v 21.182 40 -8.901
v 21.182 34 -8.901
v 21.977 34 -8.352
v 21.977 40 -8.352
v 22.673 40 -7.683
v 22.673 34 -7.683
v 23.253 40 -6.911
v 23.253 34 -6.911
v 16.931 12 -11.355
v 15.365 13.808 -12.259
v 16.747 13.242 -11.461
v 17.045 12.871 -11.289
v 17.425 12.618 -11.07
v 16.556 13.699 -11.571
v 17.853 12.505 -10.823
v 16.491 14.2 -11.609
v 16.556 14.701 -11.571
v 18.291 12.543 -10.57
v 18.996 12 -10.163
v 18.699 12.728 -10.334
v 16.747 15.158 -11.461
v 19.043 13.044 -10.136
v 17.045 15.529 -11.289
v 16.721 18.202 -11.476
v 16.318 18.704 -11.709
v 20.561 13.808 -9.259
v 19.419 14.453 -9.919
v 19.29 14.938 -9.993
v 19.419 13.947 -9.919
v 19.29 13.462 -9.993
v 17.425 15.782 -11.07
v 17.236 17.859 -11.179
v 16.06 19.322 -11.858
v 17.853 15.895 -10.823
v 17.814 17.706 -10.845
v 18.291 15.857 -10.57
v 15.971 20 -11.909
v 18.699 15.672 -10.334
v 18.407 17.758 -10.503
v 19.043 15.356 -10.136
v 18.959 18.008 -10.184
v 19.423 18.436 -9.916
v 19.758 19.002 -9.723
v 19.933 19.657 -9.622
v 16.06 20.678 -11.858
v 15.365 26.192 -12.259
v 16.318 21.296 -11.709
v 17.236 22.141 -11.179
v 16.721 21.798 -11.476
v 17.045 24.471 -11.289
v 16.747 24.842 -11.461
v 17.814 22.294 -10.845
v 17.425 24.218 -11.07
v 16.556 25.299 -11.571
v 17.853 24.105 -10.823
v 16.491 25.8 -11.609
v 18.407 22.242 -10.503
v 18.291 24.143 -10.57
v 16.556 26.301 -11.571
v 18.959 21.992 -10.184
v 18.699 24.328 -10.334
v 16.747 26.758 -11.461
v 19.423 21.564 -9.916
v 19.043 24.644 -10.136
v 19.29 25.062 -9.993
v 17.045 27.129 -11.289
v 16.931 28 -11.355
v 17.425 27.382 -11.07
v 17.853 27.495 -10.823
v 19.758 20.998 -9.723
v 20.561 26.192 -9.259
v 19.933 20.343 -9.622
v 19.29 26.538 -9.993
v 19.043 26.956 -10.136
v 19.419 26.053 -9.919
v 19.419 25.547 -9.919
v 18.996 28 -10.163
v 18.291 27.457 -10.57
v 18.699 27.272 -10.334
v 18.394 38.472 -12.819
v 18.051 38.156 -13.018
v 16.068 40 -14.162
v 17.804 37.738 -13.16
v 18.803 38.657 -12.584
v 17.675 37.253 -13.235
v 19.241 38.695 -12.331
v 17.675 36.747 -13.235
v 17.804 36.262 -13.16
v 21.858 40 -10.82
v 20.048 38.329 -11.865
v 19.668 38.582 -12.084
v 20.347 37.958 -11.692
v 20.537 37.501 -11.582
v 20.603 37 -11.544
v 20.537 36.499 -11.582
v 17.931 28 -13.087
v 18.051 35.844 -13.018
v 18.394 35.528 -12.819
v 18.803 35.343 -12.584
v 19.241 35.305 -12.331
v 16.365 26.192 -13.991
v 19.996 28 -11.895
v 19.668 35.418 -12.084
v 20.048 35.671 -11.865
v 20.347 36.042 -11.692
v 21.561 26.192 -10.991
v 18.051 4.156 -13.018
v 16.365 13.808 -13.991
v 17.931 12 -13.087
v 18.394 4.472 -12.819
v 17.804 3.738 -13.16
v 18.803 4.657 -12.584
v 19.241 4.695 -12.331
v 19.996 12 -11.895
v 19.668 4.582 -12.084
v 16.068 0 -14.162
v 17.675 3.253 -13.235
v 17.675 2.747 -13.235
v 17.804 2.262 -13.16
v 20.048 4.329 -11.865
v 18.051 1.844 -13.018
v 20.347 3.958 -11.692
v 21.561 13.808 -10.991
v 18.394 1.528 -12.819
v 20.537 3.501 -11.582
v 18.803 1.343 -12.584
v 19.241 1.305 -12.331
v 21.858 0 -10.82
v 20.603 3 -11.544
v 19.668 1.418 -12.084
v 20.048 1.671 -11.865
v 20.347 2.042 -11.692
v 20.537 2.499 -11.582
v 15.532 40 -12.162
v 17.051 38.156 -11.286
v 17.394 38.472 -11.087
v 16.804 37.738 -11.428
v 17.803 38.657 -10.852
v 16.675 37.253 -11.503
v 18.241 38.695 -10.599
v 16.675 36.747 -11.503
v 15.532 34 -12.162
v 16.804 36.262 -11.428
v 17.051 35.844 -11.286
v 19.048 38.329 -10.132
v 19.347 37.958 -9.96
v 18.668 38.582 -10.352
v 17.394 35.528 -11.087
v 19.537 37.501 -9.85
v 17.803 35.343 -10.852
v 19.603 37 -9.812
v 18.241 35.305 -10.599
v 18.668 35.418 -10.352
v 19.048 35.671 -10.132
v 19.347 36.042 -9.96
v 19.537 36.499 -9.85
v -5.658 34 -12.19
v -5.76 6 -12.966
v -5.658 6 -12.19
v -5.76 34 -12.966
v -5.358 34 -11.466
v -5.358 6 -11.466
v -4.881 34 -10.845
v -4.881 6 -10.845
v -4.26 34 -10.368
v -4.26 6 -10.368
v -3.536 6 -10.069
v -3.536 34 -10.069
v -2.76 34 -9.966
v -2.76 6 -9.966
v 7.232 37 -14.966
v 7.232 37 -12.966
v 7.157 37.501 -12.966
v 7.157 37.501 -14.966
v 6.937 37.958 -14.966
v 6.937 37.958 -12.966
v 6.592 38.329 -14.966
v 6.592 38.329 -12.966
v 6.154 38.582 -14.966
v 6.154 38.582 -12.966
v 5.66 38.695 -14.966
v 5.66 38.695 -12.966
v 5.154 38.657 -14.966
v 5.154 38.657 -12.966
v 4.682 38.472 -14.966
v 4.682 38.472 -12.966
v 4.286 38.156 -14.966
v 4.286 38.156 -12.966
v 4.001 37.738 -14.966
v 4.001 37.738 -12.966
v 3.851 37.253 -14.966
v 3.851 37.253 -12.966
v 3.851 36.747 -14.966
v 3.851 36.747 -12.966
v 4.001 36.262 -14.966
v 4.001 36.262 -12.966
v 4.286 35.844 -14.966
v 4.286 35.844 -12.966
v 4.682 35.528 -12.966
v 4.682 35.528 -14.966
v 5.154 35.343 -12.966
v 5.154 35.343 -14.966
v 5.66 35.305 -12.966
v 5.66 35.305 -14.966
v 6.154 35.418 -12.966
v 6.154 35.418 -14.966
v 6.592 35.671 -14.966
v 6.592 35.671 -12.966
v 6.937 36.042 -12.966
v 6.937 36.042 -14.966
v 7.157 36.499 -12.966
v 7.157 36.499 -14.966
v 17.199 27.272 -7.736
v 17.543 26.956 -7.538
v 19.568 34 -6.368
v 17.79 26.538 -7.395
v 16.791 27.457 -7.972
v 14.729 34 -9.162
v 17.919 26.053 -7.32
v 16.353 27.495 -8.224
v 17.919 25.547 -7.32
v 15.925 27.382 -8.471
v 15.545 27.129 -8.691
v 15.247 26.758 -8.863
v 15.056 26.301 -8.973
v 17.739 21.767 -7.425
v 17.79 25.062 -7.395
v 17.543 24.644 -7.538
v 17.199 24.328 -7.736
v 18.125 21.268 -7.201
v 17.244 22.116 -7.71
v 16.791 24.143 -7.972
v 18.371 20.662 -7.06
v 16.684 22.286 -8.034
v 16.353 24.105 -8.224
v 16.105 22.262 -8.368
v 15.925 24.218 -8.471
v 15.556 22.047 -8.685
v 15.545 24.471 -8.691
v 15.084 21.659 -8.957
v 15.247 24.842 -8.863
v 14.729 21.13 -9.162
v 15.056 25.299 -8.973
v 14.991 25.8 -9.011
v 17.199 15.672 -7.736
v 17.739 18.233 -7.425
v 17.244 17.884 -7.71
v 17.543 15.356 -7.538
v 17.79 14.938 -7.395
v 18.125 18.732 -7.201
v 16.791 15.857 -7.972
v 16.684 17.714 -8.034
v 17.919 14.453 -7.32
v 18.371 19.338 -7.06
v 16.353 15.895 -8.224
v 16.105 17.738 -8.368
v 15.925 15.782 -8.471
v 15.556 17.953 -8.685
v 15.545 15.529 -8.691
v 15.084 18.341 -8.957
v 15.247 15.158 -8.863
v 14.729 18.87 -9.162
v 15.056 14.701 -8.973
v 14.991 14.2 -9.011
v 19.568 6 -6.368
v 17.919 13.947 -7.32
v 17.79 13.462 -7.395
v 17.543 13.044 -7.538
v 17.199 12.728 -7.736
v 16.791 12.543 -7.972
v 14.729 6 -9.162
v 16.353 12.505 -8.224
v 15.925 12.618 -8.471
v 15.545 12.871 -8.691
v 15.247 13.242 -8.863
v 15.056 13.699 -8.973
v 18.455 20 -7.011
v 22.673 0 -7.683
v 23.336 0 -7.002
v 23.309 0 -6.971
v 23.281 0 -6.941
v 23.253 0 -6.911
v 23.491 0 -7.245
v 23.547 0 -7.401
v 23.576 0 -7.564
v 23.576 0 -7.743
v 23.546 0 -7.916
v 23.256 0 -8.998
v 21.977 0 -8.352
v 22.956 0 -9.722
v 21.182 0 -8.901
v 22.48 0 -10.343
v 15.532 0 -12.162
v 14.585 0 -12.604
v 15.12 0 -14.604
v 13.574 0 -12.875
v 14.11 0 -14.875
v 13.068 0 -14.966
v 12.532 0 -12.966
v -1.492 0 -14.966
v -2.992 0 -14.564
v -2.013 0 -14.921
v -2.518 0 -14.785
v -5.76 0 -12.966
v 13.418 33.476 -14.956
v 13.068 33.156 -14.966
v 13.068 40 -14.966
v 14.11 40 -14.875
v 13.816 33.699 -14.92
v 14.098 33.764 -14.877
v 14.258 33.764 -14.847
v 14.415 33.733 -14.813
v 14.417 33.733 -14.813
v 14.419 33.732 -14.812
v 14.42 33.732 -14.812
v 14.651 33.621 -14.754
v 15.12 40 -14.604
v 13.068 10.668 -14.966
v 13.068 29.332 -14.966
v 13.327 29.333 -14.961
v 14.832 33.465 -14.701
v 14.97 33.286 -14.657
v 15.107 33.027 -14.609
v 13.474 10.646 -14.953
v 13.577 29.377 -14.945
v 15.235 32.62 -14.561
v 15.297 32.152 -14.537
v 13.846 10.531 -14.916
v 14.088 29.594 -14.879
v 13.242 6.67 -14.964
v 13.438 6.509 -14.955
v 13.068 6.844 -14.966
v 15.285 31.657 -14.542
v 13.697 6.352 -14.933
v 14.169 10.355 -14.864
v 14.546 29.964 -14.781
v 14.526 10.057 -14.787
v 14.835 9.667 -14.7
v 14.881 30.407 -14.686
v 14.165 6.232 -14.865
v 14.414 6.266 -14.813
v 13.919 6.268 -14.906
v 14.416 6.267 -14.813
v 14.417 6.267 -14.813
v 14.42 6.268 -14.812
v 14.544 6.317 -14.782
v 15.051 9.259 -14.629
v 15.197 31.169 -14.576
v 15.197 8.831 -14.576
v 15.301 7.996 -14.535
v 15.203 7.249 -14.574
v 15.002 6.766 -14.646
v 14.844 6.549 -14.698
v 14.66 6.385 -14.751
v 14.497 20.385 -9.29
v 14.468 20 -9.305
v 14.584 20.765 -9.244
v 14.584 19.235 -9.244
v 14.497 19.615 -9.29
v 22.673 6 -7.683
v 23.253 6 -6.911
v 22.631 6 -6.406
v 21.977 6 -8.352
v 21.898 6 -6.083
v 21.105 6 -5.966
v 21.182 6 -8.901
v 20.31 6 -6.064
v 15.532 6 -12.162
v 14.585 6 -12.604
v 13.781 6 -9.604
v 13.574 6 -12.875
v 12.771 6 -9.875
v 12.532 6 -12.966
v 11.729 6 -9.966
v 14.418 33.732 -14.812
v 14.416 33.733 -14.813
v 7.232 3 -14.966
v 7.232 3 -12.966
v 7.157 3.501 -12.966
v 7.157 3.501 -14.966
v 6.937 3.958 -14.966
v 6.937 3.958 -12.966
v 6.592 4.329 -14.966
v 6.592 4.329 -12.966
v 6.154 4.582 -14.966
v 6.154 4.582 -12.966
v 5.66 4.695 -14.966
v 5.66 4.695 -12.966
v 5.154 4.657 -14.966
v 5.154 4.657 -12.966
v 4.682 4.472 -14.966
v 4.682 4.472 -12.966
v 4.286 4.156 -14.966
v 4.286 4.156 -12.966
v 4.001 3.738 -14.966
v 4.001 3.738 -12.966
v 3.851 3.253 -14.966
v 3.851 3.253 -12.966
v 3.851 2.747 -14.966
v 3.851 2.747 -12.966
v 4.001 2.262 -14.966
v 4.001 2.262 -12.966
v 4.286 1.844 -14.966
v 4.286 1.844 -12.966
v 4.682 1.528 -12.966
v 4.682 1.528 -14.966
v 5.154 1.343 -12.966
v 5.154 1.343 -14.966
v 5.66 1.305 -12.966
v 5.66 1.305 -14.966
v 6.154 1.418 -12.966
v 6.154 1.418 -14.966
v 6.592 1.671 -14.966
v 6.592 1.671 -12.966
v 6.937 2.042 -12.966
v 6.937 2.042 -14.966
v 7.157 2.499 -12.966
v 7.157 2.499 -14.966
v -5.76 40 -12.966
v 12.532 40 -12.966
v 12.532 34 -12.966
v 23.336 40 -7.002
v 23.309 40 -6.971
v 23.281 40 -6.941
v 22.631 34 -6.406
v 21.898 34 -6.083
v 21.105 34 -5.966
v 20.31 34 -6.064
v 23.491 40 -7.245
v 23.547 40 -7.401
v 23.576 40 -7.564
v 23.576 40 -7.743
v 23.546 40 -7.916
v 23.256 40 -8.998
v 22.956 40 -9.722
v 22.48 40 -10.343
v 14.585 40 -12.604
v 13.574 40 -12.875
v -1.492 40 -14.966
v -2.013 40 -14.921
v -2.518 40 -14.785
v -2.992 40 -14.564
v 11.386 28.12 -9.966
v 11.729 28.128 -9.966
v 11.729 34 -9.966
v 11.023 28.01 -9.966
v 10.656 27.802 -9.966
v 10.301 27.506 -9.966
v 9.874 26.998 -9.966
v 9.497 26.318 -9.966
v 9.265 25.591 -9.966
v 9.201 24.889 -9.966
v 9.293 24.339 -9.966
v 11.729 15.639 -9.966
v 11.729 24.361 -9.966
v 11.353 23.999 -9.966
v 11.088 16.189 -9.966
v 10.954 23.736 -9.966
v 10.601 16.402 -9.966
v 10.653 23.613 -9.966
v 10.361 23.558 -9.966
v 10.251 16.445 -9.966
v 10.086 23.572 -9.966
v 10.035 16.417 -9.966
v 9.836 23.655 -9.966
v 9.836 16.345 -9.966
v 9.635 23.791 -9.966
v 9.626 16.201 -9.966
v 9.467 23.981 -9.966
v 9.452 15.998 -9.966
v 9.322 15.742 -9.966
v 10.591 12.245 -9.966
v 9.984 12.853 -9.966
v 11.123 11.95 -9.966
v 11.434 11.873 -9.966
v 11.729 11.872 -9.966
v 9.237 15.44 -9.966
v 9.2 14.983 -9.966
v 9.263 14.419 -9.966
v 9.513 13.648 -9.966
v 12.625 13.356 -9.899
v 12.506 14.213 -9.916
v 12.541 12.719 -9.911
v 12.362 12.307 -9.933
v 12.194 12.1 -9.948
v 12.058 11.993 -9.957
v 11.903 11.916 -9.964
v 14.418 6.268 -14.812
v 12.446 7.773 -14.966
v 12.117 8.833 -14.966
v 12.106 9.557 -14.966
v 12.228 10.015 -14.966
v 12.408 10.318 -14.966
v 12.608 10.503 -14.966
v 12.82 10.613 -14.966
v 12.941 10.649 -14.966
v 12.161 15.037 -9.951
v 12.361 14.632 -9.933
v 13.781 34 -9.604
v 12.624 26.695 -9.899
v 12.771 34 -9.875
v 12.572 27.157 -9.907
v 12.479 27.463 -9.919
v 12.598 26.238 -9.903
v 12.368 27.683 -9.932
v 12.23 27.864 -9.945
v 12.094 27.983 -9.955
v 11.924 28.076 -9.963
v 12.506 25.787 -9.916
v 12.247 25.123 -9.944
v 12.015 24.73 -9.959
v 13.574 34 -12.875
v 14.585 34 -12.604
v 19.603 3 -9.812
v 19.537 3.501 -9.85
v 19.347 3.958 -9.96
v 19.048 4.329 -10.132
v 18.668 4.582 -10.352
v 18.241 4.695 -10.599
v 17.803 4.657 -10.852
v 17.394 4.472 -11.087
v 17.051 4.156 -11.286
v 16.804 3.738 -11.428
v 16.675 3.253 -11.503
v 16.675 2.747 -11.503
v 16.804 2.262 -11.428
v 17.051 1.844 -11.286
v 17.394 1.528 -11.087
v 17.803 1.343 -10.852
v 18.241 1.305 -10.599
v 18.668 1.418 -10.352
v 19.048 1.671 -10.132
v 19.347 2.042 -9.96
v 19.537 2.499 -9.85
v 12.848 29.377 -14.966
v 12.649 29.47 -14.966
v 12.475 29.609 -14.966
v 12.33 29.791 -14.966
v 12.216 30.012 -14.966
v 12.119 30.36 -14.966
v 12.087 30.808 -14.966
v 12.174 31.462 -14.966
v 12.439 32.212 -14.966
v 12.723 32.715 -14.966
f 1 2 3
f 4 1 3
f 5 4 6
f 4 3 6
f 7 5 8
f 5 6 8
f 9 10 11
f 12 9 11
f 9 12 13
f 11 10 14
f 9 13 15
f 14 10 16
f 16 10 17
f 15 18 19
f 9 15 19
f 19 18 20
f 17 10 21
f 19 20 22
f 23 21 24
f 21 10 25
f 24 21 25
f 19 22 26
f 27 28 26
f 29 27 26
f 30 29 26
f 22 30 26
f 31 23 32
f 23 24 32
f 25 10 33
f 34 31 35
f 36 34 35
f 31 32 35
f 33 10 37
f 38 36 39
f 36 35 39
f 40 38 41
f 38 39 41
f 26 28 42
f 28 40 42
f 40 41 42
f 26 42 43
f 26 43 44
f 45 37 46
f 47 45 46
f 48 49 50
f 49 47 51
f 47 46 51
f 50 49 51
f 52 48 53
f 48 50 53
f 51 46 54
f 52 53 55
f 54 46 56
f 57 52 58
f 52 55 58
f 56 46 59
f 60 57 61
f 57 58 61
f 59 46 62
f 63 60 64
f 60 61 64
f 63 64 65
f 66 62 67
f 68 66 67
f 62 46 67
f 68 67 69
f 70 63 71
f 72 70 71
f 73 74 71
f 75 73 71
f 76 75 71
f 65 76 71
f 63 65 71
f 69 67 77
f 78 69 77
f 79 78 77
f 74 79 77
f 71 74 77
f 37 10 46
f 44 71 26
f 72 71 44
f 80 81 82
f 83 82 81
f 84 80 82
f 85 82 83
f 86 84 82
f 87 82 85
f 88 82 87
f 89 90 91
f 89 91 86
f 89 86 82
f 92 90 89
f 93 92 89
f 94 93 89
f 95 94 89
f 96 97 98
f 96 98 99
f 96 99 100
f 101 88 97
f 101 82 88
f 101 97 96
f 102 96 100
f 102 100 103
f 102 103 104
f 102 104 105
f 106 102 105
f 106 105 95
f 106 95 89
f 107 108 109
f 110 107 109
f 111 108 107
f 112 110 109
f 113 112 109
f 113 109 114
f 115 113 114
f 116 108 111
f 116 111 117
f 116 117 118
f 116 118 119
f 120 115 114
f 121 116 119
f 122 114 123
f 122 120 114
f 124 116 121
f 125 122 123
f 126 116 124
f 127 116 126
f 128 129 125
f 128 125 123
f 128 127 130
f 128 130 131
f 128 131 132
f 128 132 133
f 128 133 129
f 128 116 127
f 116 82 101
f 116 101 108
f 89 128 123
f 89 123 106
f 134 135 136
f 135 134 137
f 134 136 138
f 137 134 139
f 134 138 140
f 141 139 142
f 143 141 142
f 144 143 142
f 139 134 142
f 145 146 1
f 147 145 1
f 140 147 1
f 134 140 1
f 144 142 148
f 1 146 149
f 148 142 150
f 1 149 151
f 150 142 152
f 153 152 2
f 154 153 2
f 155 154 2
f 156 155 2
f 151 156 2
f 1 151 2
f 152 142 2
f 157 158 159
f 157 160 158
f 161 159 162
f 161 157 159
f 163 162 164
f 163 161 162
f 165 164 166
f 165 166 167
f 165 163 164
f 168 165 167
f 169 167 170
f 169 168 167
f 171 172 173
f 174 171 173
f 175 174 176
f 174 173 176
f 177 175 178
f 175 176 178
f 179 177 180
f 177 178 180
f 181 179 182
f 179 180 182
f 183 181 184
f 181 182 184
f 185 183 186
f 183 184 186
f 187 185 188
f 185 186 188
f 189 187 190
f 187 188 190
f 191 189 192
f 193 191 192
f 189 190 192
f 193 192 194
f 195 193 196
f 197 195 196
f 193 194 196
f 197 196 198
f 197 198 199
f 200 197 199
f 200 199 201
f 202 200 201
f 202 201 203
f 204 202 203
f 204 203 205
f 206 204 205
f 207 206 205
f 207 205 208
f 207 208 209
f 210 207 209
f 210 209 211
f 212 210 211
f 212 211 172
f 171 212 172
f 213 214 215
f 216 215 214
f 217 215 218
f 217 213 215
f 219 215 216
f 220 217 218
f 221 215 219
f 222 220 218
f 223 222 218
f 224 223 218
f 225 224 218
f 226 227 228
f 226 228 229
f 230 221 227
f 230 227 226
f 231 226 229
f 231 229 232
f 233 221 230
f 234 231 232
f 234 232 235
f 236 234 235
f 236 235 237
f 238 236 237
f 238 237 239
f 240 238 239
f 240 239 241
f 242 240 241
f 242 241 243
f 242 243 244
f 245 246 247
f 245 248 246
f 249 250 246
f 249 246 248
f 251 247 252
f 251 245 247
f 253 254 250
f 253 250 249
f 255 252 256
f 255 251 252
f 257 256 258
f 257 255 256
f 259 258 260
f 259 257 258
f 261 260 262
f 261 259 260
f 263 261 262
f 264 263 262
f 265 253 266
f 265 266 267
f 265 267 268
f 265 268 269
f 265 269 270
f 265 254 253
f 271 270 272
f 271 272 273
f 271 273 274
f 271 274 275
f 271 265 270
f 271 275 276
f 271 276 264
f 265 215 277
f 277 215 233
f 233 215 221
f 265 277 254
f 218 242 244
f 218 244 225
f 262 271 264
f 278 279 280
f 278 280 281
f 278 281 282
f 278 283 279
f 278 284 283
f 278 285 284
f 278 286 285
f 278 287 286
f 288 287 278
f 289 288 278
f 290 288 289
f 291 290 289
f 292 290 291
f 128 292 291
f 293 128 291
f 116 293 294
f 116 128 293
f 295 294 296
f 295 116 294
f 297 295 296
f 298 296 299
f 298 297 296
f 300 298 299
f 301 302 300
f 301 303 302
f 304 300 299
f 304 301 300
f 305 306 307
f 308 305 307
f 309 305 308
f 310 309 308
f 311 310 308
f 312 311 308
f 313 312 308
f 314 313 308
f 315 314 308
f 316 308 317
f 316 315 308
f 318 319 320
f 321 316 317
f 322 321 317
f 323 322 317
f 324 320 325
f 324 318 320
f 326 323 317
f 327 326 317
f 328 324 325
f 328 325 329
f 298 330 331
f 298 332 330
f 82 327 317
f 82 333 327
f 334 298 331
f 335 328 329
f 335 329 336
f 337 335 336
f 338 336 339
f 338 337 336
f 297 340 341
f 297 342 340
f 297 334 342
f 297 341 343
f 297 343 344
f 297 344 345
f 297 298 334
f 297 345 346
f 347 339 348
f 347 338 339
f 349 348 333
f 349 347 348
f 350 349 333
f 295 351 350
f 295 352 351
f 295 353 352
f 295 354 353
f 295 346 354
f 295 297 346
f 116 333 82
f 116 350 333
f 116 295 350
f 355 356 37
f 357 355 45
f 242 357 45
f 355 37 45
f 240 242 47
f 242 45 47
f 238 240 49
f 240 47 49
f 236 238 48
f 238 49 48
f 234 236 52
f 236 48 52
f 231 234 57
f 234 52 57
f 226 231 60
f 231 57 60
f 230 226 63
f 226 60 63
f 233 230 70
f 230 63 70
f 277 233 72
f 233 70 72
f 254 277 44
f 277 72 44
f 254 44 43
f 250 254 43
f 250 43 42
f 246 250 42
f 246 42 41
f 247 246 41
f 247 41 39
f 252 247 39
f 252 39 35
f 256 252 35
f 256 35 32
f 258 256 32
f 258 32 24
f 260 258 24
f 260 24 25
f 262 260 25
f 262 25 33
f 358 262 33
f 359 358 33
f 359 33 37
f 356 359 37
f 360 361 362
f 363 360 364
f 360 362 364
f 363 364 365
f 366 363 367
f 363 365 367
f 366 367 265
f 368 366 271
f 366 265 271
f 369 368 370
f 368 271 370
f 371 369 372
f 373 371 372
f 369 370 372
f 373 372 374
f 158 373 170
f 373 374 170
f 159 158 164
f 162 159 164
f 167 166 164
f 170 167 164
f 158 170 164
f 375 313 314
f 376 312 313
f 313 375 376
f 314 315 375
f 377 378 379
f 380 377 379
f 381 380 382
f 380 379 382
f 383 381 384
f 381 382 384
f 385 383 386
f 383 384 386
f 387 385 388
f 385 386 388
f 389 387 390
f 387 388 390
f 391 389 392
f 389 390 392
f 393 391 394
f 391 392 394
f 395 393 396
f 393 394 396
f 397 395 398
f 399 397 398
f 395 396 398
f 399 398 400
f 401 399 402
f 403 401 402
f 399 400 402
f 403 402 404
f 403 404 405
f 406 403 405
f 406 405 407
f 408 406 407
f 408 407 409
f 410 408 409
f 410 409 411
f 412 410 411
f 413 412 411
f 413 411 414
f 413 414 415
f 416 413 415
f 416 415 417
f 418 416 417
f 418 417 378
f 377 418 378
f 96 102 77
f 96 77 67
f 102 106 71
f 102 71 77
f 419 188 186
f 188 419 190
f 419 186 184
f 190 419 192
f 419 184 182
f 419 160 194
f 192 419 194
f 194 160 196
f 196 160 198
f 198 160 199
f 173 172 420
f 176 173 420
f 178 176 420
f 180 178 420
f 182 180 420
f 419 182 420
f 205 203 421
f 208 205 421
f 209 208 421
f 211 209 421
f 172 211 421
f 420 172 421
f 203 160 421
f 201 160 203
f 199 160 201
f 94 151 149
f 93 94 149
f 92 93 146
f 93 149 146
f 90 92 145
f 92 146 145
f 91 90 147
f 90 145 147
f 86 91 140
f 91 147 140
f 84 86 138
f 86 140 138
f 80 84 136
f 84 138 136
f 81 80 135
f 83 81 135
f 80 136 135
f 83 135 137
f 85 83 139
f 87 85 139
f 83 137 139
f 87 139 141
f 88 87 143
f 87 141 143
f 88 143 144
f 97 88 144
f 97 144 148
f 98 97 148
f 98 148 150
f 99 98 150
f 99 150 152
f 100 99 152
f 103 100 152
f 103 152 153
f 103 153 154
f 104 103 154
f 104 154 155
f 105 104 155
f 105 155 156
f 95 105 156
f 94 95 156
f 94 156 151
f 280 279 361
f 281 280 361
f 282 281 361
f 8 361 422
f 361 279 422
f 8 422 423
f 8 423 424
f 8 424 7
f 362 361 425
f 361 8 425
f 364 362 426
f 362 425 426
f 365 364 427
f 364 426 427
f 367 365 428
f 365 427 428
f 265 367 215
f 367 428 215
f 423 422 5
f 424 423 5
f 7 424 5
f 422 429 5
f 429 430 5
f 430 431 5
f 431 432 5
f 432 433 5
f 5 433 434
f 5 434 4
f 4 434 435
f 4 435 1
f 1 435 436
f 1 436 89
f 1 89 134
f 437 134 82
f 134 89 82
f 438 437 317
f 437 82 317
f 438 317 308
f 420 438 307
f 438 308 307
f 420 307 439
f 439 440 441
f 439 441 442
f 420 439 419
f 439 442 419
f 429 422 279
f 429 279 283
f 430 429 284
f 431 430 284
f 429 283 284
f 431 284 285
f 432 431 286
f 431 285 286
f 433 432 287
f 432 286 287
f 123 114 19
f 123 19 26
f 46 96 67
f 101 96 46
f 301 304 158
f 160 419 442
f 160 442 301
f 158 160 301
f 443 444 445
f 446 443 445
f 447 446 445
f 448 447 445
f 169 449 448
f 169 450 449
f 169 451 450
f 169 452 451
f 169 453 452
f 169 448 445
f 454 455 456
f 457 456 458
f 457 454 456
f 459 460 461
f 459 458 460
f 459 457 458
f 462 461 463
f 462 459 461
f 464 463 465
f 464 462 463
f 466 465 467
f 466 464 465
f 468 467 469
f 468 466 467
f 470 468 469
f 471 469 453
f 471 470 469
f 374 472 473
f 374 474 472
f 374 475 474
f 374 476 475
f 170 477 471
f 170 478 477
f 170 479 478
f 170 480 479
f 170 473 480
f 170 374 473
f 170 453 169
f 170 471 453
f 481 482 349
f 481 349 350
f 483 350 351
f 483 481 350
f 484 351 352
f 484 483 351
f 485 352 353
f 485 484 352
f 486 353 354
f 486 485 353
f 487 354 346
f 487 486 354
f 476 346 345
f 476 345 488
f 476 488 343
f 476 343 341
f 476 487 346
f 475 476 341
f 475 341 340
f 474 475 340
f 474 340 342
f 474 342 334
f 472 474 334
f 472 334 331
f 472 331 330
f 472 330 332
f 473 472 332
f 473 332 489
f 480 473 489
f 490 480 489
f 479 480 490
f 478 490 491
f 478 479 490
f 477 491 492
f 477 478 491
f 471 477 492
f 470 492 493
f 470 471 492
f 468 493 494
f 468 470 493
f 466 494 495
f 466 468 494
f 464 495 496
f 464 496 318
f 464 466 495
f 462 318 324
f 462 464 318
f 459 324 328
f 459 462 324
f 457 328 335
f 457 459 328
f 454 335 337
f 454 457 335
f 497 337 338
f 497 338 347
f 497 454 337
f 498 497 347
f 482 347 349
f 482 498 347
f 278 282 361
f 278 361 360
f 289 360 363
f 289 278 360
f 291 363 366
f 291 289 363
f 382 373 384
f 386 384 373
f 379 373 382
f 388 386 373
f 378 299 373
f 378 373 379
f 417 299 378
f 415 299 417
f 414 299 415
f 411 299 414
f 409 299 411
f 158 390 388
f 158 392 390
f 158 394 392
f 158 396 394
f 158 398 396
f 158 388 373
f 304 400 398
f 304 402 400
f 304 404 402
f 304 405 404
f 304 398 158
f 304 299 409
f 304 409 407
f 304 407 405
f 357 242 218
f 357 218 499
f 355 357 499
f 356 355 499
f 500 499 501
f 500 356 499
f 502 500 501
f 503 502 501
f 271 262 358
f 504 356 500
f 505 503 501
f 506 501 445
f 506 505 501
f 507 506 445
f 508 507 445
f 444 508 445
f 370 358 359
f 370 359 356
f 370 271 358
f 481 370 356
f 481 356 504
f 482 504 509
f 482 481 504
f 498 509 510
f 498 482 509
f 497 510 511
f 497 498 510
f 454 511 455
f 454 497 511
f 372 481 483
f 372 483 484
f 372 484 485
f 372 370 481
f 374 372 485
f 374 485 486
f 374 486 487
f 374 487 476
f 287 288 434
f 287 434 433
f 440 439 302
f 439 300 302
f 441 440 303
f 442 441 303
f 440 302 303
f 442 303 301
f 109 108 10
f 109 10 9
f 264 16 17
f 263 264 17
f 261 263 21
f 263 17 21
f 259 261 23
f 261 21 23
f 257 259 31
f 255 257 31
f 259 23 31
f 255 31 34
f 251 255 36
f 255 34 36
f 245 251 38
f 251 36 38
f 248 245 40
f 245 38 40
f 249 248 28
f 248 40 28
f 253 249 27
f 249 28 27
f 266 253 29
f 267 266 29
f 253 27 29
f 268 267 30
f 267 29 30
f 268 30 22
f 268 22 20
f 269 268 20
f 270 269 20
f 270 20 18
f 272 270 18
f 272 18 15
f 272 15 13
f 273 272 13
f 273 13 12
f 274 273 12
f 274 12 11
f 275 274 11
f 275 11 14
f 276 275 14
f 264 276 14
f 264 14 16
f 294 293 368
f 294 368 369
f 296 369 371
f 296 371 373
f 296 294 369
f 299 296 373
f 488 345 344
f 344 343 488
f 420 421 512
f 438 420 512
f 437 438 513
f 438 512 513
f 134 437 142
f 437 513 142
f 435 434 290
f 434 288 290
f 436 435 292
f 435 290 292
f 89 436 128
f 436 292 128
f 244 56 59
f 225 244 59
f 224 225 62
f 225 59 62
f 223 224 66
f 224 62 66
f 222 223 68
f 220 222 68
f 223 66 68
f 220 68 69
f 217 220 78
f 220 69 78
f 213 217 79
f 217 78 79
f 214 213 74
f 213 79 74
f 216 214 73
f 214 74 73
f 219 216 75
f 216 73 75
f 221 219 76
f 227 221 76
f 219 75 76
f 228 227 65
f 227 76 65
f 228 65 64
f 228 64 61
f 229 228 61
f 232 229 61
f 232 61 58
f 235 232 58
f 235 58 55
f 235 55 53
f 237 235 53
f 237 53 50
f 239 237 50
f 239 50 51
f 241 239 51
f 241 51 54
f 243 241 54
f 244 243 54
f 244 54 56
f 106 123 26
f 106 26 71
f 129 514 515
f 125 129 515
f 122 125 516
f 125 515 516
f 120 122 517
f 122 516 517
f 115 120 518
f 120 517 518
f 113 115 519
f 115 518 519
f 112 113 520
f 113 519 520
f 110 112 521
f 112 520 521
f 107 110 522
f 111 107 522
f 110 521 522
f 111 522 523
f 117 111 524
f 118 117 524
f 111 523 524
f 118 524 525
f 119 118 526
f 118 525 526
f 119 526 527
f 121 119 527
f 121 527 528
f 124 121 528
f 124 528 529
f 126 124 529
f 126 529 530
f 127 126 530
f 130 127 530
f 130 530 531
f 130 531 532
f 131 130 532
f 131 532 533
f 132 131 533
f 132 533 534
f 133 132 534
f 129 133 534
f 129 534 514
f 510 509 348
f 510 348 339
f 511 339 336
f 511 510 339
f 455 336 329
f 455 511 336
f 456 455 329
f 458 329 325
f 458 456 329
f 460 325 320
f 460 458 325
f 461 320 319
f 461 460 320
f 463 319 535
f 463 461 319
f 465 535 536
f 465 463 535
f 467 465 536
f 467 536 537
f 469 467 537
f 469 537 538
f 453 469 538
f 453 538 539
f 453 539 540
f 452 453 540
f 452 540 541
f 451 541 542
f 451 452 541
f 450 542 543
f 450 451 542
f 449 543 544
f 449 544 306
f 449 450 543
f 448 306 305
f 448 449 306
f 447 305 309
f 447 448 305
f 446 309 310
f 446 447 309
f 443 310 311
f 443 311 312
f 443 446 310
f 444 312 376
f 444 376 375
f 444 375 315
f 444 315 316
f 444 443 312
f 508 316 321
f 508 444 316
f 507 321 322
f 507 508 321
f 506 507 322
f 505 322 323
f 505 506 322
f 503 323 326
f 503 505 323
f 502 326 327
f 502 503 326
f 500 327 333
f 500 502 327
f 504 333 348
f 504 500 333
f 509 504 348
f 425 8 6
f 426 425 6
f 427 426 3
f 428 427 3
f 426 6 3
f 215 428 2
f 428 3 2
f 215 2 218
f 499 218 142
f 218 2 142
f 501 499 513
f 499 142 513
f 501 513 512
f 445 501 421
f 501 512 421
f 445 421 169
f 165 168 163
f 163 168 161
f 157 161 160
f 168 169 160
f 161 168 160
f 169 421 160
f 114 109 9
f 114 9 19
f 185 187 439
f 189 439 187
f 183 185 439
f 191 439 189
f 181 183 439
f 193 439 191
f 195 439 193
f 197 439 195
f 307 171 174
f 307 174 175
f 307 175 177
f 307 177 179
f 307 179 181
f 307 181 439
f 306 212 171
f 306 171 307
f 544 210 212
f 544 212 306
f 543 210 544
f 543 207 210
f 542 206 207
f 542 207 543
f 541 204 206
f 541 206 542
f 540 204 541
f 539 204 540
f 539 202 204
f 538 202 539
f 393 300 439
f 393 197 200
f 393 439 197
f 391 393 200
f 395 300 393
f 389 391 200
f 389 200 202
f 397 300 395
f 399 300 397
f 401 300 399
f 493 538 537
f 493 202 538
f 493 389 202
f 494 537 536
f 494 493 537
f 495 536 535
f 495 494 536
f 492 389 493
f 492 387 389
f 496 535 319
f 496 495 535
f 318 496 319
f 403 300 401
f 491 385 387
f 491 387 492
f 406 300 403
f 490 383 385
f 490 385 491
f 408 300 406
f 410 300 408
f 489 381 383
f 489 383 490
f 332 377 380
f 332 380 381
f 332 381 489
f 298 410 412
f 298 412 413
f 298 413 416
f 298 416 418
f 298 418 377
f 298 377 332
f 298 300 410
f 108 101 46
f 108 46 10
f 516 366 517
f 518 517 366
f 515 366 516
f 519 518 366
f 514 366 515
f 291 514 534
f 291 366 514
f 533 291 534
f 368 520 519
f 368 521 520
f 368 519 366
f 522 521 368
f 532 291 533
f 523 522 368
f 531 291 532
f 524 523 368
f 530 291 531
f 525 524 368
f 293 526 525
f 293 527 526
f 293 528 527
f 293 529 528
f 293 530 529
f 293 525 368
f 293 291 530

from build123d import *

# Parameters (mm, degrees)
AUFSATZ_LINEAR_AUSTRAGEN1_DEPTH  = 40
SCHNITT_LINEAR_AUSTRAGEN3_DEPTH  = 40
SCHNITT_LINEAR_START             = -6
SCHNITT_LINEAR_AUSTRAGEN4_DEPTH  = 6
SCHNITT_LINEAR_AUSTRAGEN5_DEPTH  = 6
VERRUNDUNG1_R                    = 3
SCHNITT_LINEAR_AUSTRAGEN6_REACH  = 45.817
SKIZZE5_R                        = 1.7
SCHNITT_LINEAR_AUSTRAGEN7_REACH  = 49.001
SKIZZE6_R                        = 1.7
SCHNITT_ROTATION_D_NN1_START     = 26.307192439
SCHNITT_ROTATION_D_NN1_OUTLINE_R = 1.5
SCHNITT_ROTATION_D_NN1_DEPTH     = 11.713572656
SCHNITT_ROTATION_D_NN2_START     = -1.977078808
SCHNITT_ROTATION_D_NN2_OUTLINE_R = 1.5
SCHNITT_ROTATION_D_NN2_DEPTH     = 11.713571611
VERRUNDUNG2_R                    = 1
SCHNITT_LINEAR_AUSTRAGEN8_DEPTH  = 2
SCHNITT_LINEAR_AUSTRAGEN9_REACH  = 45.817
SKIZZE10_R                       = 2.3
SKIZZE10_R_2                     = 1.7


# Read off the part's stored shape, not the designer's step: Schnitt-Rotation-Dünn1, Schnitt-Rotation-Dünn2
with BuildPart() as part:
    # Skizze1 → Aufsatz-Linear austragen1 (new body)
    with BuildSketch(Plane(origin=(0, 0, 0), x_dir=(1, 0, 0), z_dir=(0, 1, 0))):
        with BuildLine():
            Line((-5.759831503, 14.966295554), (13.068371728, 14.966295554))
            ThreePointArc((13.068371728, 14.966295554), (14.621285998, 14.761850511), (16.068371728, 14.162447976))
            Line((16.068371728, 14.162447976), (24.666447939, 9.198346361))
            Line((24.666447939, 9.198346361), (22.166447939, 4.868219342))
            Line((22.166447939, 4.868219342), (14.728625766, 9.162447976))
            ThreePointArc((14.728625766, 9.162447976), (13.281540036, 9.761850511), (11.728625766, 9.966295554))
            Line((11.728625766, 9.966295554), (-5.759831503, 9.966295554))
            Line((-5.759831503, 9.966295554), (-5.759831503, 14.966295554))
        make_face()
    extrude(amount=AUFSATZ_LINEAR_AUSTRAGEN1_DEPTH)

    # Skizze2 → Schnitt-Linear austragen3 (cut)
    with BuildSketch(Plane(origin=(0, 40, 0), x_dir=(1, 0, 0), z_dir=(0, 1, 0))):
        Polygon((-5.759831503, 14.966295554), (-5.759831503, 12.966295554), (-2.295729887, 14.966295554), align=None)
        Polygon((24.666447939, 9.198346361), (22.934397132, 10.198346361), (23.666447939, 7.466295554), align=None)
    extrude(amount=-SCHNITT_LINEAR_AUSTRAGEN3_DEPTH, mode=Mode.SUBTRACT)

    # Skizze3 → Schnitt-Linear austragen4 (cut)
    with BuildSketch(Plane(origin=(0, 40, 0), x_dir=(1, 0, 0), z_dir=(0, 1, 0)).offset(SCHNITT_LINEAR_START)):
        with BuildLine():
            Line((-5.759831503, 12.966295554), (12.532473343, 12.966295554))
            ThreePointArc((12.532473343, 12.966295554), (14.085387613, 12.761850511), (15.532473343, 12.162447976))
            Line((15.532473343, 12.162447976), (21.181781368, 8.900818467))
            ThreePointArc((21.181781368, 8.900818467), (23.993765179, 5.194915748), (23.31194468, 0.593167307))
            Line((23.31194468, 0.593167307), (22.166447939, 4.868219342))
            Line((22.166447939, 4.868219342), (14.728625766, 9.162447976))
            ThreePointArc((14.728625766, 9.162447976), (13.281540036, 9.761850511), (11.728625766, 9.966295554))
            Line((11.728625766, 9.966295554), (-5.759831503, 9.966295554))
            Line((-5.759831503, 9.966295554), (-5.759831503, 12.966295554))
        make_face()
    extrude(amount=SCHNITT_LINEAR_AUSTRAGEN4_DEPTH, mode=Mode.SUBTRACT)

    # Skizze4 → Schnitt-Linear austragen5 (cut)
    with BuildSketch(Plane.XZ):
        with BuildLine():
            Line((21.181781368, -8.900818467), (15.532473343, -12.162447976))
            ThreePointArc((15.532473343, -12.162447976), (14.085387614, -12.761850511), (12.532473343, -12.966295554))
            Line((12.532473343, -12.966295554), (-5.759831503, -12.966295554))
            Line((-5.759831503, -12.966295554), (-5.759831503, -9.966295554))
            Line((-5.759831503, -9.966295554), (11.728625766, -9.966295554))
            ThreePointArc((11.728625766, -9.966295554), (13.281540036, -9.761850511), (14.728625766, -9.162447976))
            Line((14.728625766, -9.162447976), (22.166447939, -4.868219342))
            Line((22.166447939, -4.868219342), (23.31194468, -0.593167307))
            ThreePointArc((23.31194468, -0.593167307), (23.993765179, -5.194915748), (21.181781368, -8.900818467))
        make_face()
    extrude(amount=-SCHNITT_LINEAR_AUSTRAGEN5_DEPTH, mode=Mode.SUBTRACT)

    # Verrundung1
    verrundung1_edges = [part.edges().sort_by_distance(p)[0] for p in [
        (22.934397132, 20, -10.198346361),
        (-2.295729887, 20, -14.966295554),
        (22.166447939, 20, -4.868219342),
        (-5.759831503, 20, -9.966295554),
    ]]
    fillet(verrundung1_edges, radius=VERRUNDUNG1_R - 0.0001)  # a hair under: the kernel refuses the full size

    # Skizze5 → Schnitt-Linear austragen6 (cut, up to next)
    with BuildSketch(Plane(origin=(9.149612796, 0, -15.847594231), x_dir=(0.8660254037844386, 0, 0.5000000000000003), z_dir=(-0.5000000000000002, 0, 0.8660254037844385)), mode=Mode.PRIVATE) as schnitt_linear_austragen6_sk1:
        with Locations((10.37029251, 3)):
            Circle(SKIZZE5_R)
    schnitt_linear_austragen6_tool1 = extrude(schnitt_linear_austragen6_sk1.sketch, amount=-SCHNITT_LINEAR_AUSTRAGEN6_REACH, mode=Mode.PRIVATE) & part.part
    # Skizze5 → Schnitt-Linear austragen6 (cut, up to next)
    with BuildSketch(Plane(origin=(9.149612796, 0, -15.847594231), x_dir=(0.8660254037844386, 0, 0.5000000000000003), z_dir=(-0.5000000000000002, 0, 0.8660254037844385)), mode=Mode.PRIVATE) as schnitt_linear_austragen6_sk2:
        with Locations((10.37029251, 37)):
            Circle(SKIZZE5_R)
    schnitt_linear_austragen6_tool2 = extrude(schnitt_linear_austragen6_sk2.sketch, amount=-SCHNITT_LINEAR_AUSTRAGEN6_REACH, mode=Mode.PRIVATE) & part.part
    add(schnitt_linear_austragen6_tool1.solids().sort_by_distance((18.13055, 3, -10.662448))[0], mode=Mode.SUBTRACT)
    add(schnitt_linear_austragen6_tool2.solids().sort_by_distance((18.13055, 37, -10.662448))[0], mode=Mode.SUBTRACT)

    # Skizze6 → Schnitt-Linear austragen7 (cut, up to next)
    with BuildSketch(Plane.XY.offset(-12.966295554), mode=Mode.PRIVATE) as schnitt_linear_austragen7_sk1:
        with Locations((5.532473343, 3)):
            Circle(SKIZZE6_R)
    schnitt_linear_austragen7_tool1 = extrude(schnitt_linear_austragen7_sk1.sketch, amount=-SCHNITT_LINEAR_AUSTRAGEN7_REACH, mode=Mode.PRIVATE) & part.part
    # Skizze6 → Schnitt-Linear austragen7 (cut, up to next)
    with BuildSketch(Plane.XY.offset(-12.966295554), mode=Mode.PRIVATE) as schnitt_linear_austragen7_sk2:
        with Locations((5.532473343, 37)):
            Circle(SKIZZE6_R)
    schnitt_linear_austragen7_tool2 = extrude(schnitt_linear_austragen7_sk2.sketch, amount=-SCHNITT_LINEAR_AUSTRAGEN7_REACH, mode=Mode.PRIVATE) & part.part
    add(schnitt_linear_austragen7_tool1.solids().sort_by_distance((5.532473, 3, -12.966296))[0], mode=Mode.SUBTRACT)
    add(schnitt_linear_austragen7_tool2.solids().sort_by_distance((5.532473, 37, -12.966296))[0], mode=Mode.SUBTRACT)

    # Schnitt-Rotation-Dünn1 outline → Schnitt-Rotation-Dünn1 (cut)
    with BuildSketch(Plane(origin=(0, 0, 0), x_dir=(0.9354143466934868, -0.26726124191241973, 0.23145502494313744), z_dir=(0.35355339059326996, 0.7071067811865439, -0.6123724356958009)).offset(SCHNITT_ROTATION_D_NN1_START)):
        with Locations((1.011284538, -9.386188067)):
            Circle(SCHNITT_ROTATION_D_NN1_OUTLINE_R)
    extrude(amount=SCHNITT_ROTATION_D_NN1_DEPTH, mode=Mode.SUBTRACT)

    # Schnitt-Rotation-Dünn2 outline → Schnitt-Rotation-Dünn2 (cut)
    with BuildSketch(Plane(origin=(0, 0, 0), x_dir=(0.9354143466934868, 0.26726124191241973, 0.23145502494313744), z_dir=(0.35355339059326996, -0.7071067811865439, -0.6123724356958009)).offset(SCHNITT_ROTATION_D_NN2_START)):
        with Locations((11.701734215, -16.799958762)):
            Circle(SCHNITT_ROTATION_D_NN2_OUTLINE_R)
    extrude(amount=SCHNITT_ROTATION_D_NN2_DEPTH, mode=Mode.SUBTRACT)

    # Verrundung2
    verrundung2_edges = [part.edges().sort_by_distance(p)[0] for p in [
        (23.666447939, 20, -7.466295554),
    ]]
    fillet(verrundung2_edges, radius=VERRUNDUNG2_R)

    # Skizze9 → Schnitt-Linear austragen8 (cut)
    with BuildSketch(Plane(origin=(10.149612796, 0, -17.579645039), x_dir=(-0.8660254037844383, 0, -0.5000000000000007), z_dir=(0.5000000000000007, 0, -0.8660254037844383))):
        Polygon((-7.177175397, 26.192388155), (-7.177175397, 13.807611845), (-8.984787242, 12), (-11.369563553, 12), (-13.177175397, 13.807611845), (-13.177175397, 26.192388155), (-11.369563553, 28), (-8.984787242, 28), align=None)
    extrude(amount=-SCHNITT_LINEAR_AUSTRAGEN8_DEPTH, mode=Mode.SUBTRACT)

    # Skizze10 → Schnitt-Linear austragen9 (cut, up to next)
    with BuildSketch(Plane(origin=(9.149612796, 0, -15.847594231), x_dir=(-0.8660254037844384, 0, -0.5000000000000007), z_dir=(0.5000000000000007, 0, -0.8660254037844384)), mode=Mode.PRIVATE) as schnitt_linear_austragen9_sk1:
        with Locations((-10.177175397, 20)):
            Circle(SKIZZE10_R)
    schnitt_linear_austragen9_tool1 = extrude(schnitt_linear_austragen9_sk1.sketch, amount=-SCHNITT_LINEAR_AUSTRAGEN9_REACH, mode=Mode.PRIVATE) & part.part
    # Skizze10 → Schnitt-Linear austragen9 (cut, up to next)
    with BuildSketch(Plane(origin=(9.149612796, 0, -15.847594231), x_dir=(-0.8660254037844384, 0, -0.5000000000000007), z_dir=(0.5000000000000007, 0, -0.8660254037844384)), mode=Mode.PRIVATE) as schnitt_linear_austragen9_sk2:
        with Locations((-10.177175397, 25.8)):
            Circle(SKIZZE10_R_2)
    schnitt_linear_austragen9_tool2 = extrude(schnitt_linear_austragen9_sk2.sketch, amount=-SCHNITT_LINEAR_AUSTRAGEN9_REACH, mode=Mode.PRIVATE) & part.part
    # Skizze10 → Schnitt-Linear austragen9 (cut, up to next)
    with BuildSketch(Plane(origin=(9.149612796, 0, -15.847594231), x_dir=(-0.8660254037844384, 0, -0.5000000000000007), z_dir=(0.5000000000000007, 0, -0.8660254037844384)), mode=Mode.PRIVATE) as schnitt_linear_austragen9_sk3:
        with Locations((-10.177175397, 14.2)):
            Circle(SKIZZE10_R_2)
    schnitt_linear_austragen9_tool3 = extrude(schnitt_linear_austragen9_sk3.sketch, amount=-SCHNITT_LINEAR_AUSTRAGEN9_REACH, mode=Mode.PRIVATE) & part.part
    add(schnitt_linear_austragen9_tool1.solids().sort_by_distance((17.963305, 20, -10.759007))[0], mode=Mode.SUBTRACT)
    add(schnitt_linear_austragen9_tool2.solids().sort_by_distance((17.963305, 25.8, -10.759007))[0], mode=Mode.SUBTRACT)
    add(schnitt_linear_austragen9_tool3.solids().sort_by_distance((17.963305, 14.2, -10.759007))[0], mode=Mode.SUBTRACT)


solid = part.part
